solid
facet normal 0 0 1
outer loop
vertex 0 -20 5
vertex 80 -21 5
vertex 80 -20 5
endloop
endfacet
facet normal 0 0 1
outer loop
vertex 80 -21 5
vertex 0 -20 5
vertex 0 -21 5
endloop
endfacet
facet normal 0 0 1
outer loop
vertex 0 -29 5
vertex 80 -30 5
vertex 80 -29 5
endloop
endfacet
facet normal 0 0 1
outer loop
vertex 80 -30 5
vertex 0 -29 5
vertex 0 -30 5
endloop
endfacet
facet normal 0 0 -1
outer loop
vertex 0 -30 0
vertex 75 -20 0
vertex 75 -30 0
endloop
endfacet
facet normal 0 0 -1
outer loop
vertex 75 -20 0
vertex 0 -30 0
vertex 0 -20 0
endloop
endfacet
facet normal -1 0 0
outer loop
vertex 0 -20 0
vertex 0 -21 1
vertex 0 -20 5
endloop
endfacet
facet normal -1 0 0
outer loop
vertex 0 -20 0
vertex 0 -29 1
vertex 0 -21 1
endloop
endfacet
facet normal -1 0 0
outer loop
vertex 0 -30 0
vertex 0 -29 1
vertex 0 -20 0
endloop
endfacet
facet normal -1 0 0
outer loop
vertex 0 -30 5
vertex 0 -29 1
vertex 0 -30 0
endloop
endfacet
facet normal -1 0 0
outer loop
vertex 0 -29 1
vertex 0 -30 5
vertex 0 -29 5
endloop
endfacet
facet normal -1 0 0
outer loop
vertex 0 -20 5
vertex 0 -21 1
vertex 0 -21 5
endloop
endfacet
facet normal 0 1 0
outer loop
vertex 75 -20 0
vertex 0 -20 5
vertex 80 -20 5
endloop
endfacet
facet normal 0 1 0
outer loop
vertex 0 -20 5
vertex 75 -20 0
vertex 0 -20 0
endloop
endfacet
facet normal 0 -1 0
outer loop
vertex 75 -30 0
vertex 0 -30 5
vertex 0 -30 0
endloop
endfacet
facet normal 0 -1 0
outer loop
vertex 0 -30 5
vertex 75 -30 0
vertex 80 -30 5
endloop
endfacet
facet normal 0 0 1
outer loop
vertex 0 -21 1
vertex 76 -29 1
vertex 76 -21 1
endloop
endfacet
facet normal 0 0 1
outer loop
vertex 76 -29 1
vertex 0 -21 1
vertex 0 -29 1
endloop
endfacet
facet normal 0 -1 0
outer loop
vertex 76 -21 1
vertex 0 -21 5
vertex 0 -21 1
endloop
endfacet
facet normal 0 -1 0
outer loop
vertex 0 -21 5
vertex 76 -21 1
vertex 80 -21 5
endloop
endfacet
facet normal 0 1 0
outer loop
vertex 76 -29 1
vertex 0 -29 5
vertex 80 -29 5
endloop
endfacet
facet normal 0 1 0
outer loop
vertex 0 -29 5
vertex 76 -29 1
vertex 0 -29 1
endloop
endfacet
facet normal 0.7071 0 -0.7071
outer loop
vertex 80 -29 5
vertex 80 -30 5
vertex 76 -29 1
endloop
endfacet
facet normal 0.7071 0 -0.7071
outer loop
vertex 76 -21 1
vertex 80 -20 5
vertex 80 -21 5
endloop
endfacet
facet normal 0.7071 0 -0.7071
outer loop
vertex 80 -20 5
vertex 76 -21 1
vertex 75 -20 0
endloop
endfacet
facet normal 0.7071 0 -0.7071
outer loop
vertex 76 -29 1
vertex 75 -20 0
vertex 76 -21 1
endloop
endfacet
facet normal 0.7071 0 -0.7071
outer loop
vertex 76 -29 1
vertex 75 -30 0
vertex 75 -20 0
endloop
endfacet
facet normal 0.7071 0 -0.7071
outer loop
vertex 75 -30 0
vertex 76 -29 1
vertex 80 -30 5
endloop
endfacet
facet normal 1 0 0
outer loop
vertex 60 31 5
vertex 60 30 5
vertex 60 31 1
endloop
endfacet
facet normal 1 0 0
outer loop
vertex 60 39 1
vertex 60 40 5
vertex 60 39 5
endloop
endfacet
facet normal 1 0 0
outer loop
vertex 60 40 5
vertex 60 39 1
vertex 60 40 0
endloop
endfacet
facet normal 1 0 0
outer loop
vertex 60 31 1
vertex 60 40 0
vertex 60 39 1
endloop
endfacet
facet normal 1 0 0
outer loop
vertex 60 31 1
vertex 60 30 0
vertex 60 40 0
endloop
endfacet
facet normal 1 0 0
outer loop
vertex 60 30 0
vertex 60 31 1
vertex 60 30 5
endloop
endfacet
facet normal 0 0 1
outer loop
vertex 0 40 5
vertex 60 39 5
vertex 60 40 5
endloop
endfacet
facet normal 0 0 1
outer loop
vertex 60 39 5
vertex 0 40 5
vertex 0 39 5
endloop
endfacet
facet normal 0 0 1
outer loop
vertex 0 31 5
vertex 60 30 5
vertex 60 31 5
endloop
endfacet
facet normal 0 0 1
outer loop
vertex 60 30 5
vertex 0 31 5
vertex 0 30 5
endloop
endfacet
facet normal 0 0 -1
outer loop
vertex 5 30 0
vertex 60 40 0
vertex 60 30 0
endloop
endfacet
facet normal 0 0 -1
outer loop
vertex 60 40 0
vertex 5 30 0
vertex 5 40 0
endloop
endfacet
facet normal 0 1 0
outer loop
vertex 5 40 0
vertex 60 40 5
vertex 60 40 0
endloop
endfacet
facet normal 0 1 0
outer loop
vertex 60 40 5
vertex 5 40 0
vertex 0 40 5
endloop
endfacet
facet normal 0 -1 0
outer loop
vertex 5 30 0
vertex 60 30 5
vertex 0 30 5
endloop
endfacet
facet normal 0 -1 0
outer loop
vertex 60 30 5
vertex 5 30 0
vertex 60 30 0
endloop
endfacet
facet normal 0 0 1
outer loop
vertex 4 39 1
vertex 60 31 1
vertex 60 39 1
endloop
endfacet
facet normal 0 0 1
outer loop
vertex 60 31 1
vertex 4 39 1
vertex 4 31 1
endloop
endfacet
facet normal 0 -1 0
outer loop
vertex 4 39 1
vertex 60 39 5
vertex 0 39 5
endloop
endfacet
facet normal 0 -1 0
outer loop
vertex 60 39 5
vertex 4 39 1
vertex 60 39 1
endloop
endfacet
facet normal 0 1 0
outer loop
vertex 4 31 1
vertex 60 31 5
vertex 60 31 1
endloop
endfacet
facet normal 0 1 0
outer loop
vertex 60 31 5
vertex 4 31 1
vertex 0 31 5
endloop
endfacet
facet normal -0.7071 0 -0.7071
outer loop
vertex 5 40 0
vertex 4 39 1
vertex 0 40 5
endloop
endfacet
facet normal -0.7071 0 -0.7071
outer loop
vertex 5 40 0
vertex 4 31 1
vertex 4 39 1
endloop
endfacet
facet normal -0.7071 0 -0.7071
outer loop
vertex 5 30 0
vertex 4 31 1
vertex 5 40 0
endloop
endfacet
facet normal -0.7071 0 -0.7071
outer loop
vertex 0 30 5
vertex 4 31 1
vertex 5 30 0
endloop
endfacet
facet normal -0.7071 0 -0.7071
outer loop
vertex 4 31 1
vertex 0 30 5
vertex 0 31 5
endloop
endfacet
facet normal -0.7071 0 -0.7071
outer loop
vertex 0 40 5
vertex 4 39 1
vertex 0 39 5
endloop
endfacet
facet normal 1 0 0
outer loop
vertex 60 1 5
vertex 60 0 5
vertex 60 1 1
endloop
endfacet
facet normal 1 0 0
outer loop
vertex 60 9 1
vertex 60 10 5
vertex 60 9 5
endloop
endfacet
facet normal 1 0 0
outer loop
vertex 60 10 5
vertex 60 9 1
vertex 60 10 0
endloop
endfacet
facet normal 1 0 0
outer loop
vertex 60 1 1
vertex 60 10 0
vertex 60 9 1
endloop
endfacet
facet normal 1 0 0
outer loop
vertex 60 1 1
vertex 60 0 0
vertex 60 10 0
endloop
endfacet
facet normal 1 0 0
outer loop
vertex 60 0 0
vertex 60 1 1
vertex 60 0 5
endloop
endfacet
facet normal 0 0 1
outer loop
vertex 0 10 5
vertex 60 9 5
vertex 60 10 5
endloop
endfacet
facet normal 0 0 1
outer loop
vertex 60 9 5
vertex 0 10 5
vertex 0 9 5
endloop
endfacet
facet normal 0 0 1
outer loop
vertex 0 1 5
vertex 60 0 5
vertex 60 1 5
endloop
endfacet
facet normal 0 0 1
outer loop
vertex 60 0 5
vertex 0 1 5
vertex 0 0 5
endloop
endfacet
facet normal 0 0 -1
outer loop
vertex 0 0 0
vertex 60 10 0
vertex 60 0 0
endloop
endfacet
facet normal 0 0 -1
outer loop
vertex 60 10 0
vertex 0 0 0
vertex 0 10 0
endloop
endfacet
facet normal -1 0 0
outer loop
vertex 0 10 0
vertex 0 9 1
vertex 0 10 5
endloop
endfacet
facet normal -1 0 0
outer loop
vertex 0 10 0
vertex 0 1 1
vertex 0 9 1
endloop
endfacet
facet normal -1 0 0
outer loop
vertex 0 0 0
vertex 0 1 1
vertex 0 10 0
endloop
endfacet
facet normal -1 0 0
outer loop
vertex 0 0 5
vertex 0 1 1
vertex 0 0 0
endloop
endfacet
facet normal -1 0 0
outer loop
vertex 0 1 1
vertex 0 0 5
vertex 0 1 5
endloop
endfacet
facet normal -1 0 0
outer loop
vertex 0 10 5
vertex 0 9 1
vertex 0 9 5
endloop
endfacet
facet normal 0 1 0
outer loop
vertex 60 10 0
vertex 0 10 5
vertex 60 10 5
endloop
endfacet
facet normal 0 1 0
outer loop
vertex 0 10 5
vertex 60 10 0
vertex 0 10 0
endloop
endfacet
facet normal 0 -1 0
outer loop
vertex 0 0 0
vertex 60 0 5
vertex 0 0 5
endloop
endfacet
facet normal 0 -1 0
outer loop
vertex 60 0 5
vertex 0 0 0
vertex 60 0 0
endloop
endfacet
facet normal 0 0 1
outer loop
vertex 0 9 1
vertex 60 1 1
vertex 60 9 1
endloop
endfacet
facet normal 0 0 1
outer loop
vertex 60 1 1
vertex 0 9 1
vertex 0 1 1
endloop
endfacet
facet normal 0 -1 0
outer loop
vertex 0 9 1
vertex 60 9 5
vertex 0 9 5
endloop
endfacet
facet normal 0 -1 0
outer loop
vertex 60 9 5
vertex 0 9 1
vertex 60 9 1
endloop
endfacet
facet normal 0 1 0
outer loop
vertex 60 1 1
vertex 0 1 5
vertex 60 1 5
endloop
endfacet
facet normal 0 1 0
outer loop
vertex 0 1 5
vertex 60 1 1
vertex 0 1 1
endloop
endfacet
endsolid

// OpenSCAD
// file: shapes.scad
//helper
{
    /**
 * Standard right-angled triangle
 *
 * @param number  o_len  Length of the opposite side
 * @param number  a_len  Length of the adjacent side
 * @param number  depth  How wide/deep the triangle is in the 3rd dimension
 * @param boolean center Whether to center the triangle on the origin
 * @todo a better way ?
 */
module triangle(o_len, a_len, depth, center=false)
{
    centroid = center ? [-a_len/3, -o_len/3, -depth/2] : [0, 0, 0];
    translate(centroid) linear_extrude(height=depth)
    {
        polygon(points=[[0,0],[a_len,0],[0,o_len]], paths=[[0,1,2]]);
    }
}

module trapez3d(bottom = 30, top = 25, height = 10, length = 172){
    hull(){
            trapez(bottom, top, height);
            translate([length,0,0])
            trapez(bottom, top, height);
    }    
}

module trapez(bottom = 30, top = 25, height = 10){
    echo("haha");
    off = (bottom-top);
    CubePoints = [
  [  0,  0,  0 ],  //0
  [ 0,  bottom,  0 ],  //1
  [ 0,  bottom-off,  height ],  //2
  [  0,  off,  height ]  //3
];
CubeFaces = [
  [0,1,2,3]  // bottom
  ]; // left
  
polyhedron( CubePoints, CubeFaces );
}

}

module grid(g_breite=40, g_hoehe=60, felder_lenks=2, felder_hoch=3, achsen_breite=1, achsen_tiefe=3){
    
   //assert(felder_lenks>0, "felder_lenks must be greater 0");
   // assert(felder_hoch>0, "felder_hoch must be greater 0");
    
    schritt_breite = (g_breite-achsen_breite)/felder_lenks;
    schritt_hoehe = (g_hoehe-achsen_breite)/felder_hoch;
    
    if(felder_lenks>0){
    for(lenks=[0:felder_lenks]){
        translate([lenks*schritt_breite,0,0])
        cube([achsen_breite, achsen_tiefe, g_hoehe]);
    }}
    
    if(felder_hoch>0){
    for(hoch=[0:felder_hoch]){
        translate([0,0,hoch*schritt_hoehe])
        cube([g_breite, achsen_tiefe, achsen_breite]);
    }}
}
// main file
use <shapes.scad>
//settings
{
    //enable details for final rendering
    balken_an = false;

    laenge = 180;
    breite = 90;
    hoehe = 80;

    gleis_breite = 43;
    gleis_hoehe = 15;

    c_gleis_breite = 40;
    c_gleis_schiene = 2.3;
    c_gleis_boden = 8;
    c_gleis_hoehe = c_gleis_boden+c_gleis_schiene;
    c_gleis_laenge = 188;
    c_gleis_spurweite = 16.5;

    dicke = 1;

    eingang_hoehe = gleis_hoehe + 50;
    eingang_breite = 60;

    fenster_rahmen = 15;
    fenster_hoehe = 40;
    fenster_boden_abstand=20;
    fenster_breite = 0;
    farbe_fenster = "blue";

    boden_rand = 10;

    gehweg_hoehe  =20;
    gehweg_breite = 12;
    
    kabel_kanal_breite = 10;
    kabel_kanal_hoehe = 5;
}
 
 
//elements
{
module wall(laenge, hoehe, dicke, fenster=0){
    fenster_breite = (laenge-((fenster+1)*fenster_rahmen))/fenster;
    difference(){
        union(){
            cube([laenge, dicke, hoehe]);
            if(balken_an){
                for(bar=[1:3*dicke:laenge]){
                    translate([bar, 1,0]){
                        cube([dicke, dicke, hoehe]);
                    }
                }
            }
        }
        //fenster
        if(fenster>0){
            
            for(count=[0:fenster-1]){
                translate([fenster_rahmen+(count*(fenster_rahmen+fenster_breite)),-1,fenster_boden_abstand]){
                    cube([fenster_breite,10,  fenster_hoehe]);
                    //fenster_innen
                    
                }
            }
            
            
        }
        
    }
    //fenster_inlet
    if(fenster > 0){
        for(count=[0:fenster-1]){
                translate([fenster_rahmen+(count*(fenster_rahmen+fenster_breite)),-1,fenster_boden_abstand]){
                    fenster_inlet(fenster_breite, fenster_hoehe);
                    //fenster_innen
                    
                }
            }
        
        
    }
    
}
module fenster_inlet(breite=20, hoehe=30, tiefe =2, rand = 3){
    breite = breite -1;//speilraum
    hoehe = hoehe -1;//speilraum
    //ausrichtung am innenfenster (nicht am kleberand)
    color(farbe_fenster)
    translate([-rand+0.5, 0, -rand+0.5]){
        //innen
        translate([rand, 0,rand])
        grid(breite, hoehe, 1, 3, 1, 3);
        //hinten
        grid(breite+2*rand, hoehe+2*rand, 1, 1, 3, 1);
        
    }
    
}



module dach(){
    
    fenster_hohe=20;
    fenster_tiefe=30;
    fenster_breite=150;
    
    pos1x=20;
    pos1y=10;
    pos2x=20;
    pos2y=60;
    
    difference(){
        
            union(){
            cube([laenge+4*dicke, breite+8*dicke, dicke]);
            translate([pos1x,pos1y,0])
                dachecke(fenster_hohe,fenster_tiefe,fenster_breite);
            translate([pos2x,pos2y,0])
                dachecke(fenster_hohe,fenster_tiefe,fenster_breite);
            }
            //dach decken löcher
            translate([pos1x+2,pos1y+2,-3])
                cube([fenster_breite-4,fenster_tiefe-8,4]);
            translate([pos2x+2,pos2y+2,-3])
                cube([fenster_breite-4,fenster_tiefe-8,4]);
           // translate([20,60,0])
          //      cube(fenster_breite,fenster_tiefe,10);
            
            
            
            
        }    
    
}

module dachecke(ecke_hohe=20, ecke_breite=30, distance=150){
    rotate([90,0,90]){
        difference(){
            hull(){
                triangle(ecke_hohe,ecke_breite,1);
                translate([0,0,distance])
                triangle(ecke_hohe,ecke_breite,1);
            }
            translate([-1,0,dicke])
            hull(){
                triangle(ecke_hohe-dicke,ecke_breite-dicke,1);
                translate([0,0,distance-2*dicke])
                triangle(ecke_hohe-dicke,ecke_breite-dicke,1);
            }
        }
        translate([0,0,distance*1/4])
                triangle(ecke_hohe,ecke_breite,1);
        translate([0,0,distance*2/4])
                triangle(ecke_hohe,ecke_breite,1);
        translate([0,0,distance*3/4])
                triangle(ecke_hohe,ecke_breite,1);
        
    }
    color(farbe_fenster){
    translate([0,-2,1])
    grid(distance+1, ecke_hohe-1, 4,1,1, 1);
    translate([0,-1,1])
    grid(distance+1, ecke_hohe-1, 0,1,1, 0.3);
    }
}



module boden(){
    
    boden_beite=breite+2*boden_rand;
    boden_laenge=laenge+ 1*boden_rand;
    
    pos1x=20;
    pos1y=10;
    pos2x=20;
    pos2y=60;
    
    difference(){
            translate([-boden_rand/2,-breite/2-boden_rand,-dicke])
            union(){
                cube([boden_laenge,boden_beite , 2*dicke]);
            
            }
            //schinen ausschnitt
            translate([-boden_rand,-breite/2-boden_rand,-dicke])
            translate([3*boden_rand,boden_beite/2-gleis_breite/2,-1])
            cube([laenge, gleis_breite, 20]);
            
            // linke wand
            translate([0,breite/2,0])
            wall(laenge, hoehe, 2.5*dicke, 4);

            // rechte wand
            translate([laenge,-breite/2,0])
            rotate([0,0,180])
            wall(laenge, hoehe, 2.5*dicke, 4);
            
            // hinten wand
            translate([2.5,-breite/2,0])
            rotate([0,0,90])
            wall(breite, hoehe, 2.5*dicke);
                
            // eingang wand
            translate([laenge-2.5,breite/2,0])
            rotate([0,0,-90])
            difference(){
                wall(breite, hoehe, 2.5*dicke);
                translate([(breite/2)-(eingang_breite/2),-dicke,0]){
                    cube([eingang_breite, 4*dicke, eingang_hoehe]);
                }
            }
        }
        
    //gehweg links
    translate([boden_rand*3,-gleis_breite/2-gehweg_breite- 5 ,0])
    gehweg();    
    //gehweg rechts
    translate([boden_rand*3,gleis_breite/2 + 5 ,0])
    gehweg(); 
    
}

module gehweg() {
    gehweg_laenge = laenge *3/6;
    translate([0,0,gehweg_hoehe])
    cube([gehweg_laenge+2*dicke, gehweg_breite, dicke]);
    
    pfosten = 6;
    abstand = gehweg_laenge/(pfosten-1);
    for(count = [0:pfosten-1]){
        translate([count*abstand,0,0])
        cube([2*dicke, gehweg_breite, gehweg_hoehe]);
    }
    //treppe hinten
    translate([-gehweg_hoehe-1, 0, 0])
    treppe();
    
    translate([gehweg_laenge+gehweg_hoehe+3, gehweg_breite, 0])
    rotate([0,0,180])
    treppe();
}

module treppe(){
    
    for(step=[1:2:gehweg_hoehe]){
            translate([step,0,0])
            cube([2, gehweg_breite, step]);
    }
}



module tuer(){
    tuer_breite = eingang_breite/2 - 1;
    tuer_hoehe = eingang_hoehe-gleis_hoehe - 2;
    
    f_rahmen = 5;
    f_hoehe = tuer_hoehe/3;
    f_breite = tuer_breite - 2*f_rahmen;
    
    difference(){
        union(){
            cube([tuer_breite, dicke, tuer_hoehe]); 
            if(balken_an){
                //deko
                d_hoehe=3;
                for(step=[0:5]){
                    translate([f_breite+f_rahmen,0,5+(step*d_hoehe)])
                    rotate([90,0,-90])                
                    triangle(d_hoehe,1,f_breite);
                }
            
            }
        }
        //fenster
        
        translate([f_rahmen,-1, tuer_hoehe-f_hoehe-f_rahmen])
        cube([f_breite,3,f_hoehe]);
        
    }
}
module gleis(x_offset, y_offset){
    translate([x_offset, y_offset,0]){
        if(balken_an){
            color("grey")
            trapez3d(c_gleis_breite, c_gleis_breite-8, c_gleis_boden, c_gleis_laenge);
            translate([0,c_gleis_breite/2-c_gleis_spurweite/2-c_gleis_schiene/2,c_gleis_boden])
            color("black")
            cube([c_gleis_laenge,c_gleis_schiene, c_gleis_schiene]);
            translate([0,c_gleis_breite/2+c_gleis_spurweite/2-c_gleis_schiene/2,c_gleis_boden])
            color("black")
            cube([c_gleis_laenge,c_gleis_schiene, c_gleis_schiene]);
        }
        else{
            cube([c_gleis_laenge, c_gleis_breite, c_gleis_hoehe]);
        }
    }
}
}
module u_kanal(u_breite=10, u_hoehe= 4, u_laenge=50, u_dicke=1, cut_top_left=false, cut_top_right=false, cut_bottom_left=false, cut_bottom_right=false){
    
    difference(){
       
       cube([ u_laenge, u_breite, u_hoehe]);
       translate([-u_dicke, u_dicke, u_dicke])
       cube([ u_laenge+2*u_dicke, u_breite-2*dicke, u_hoehe]);
        
        if(cut_top_left){
             translate([0,-u_dicke,0])
            rotate([0,-45,0])
            cube(u_breite+u_hoehe);
        }
        if(cut_top_right){
            translate([u_laenge,-u_dicke,0])
            rotate([0,-45,0])
            cube(u_breite+u_hoehe);
        }
        if(cut_bottom_left){
            translate([0,-u_dicke,u_hoehe])
            rotate([0,135,0])
            cube(u_breite+u_hoehe);
        }
        if(cut_bottom_right){
            translate([u_laenge,-u_dicke,u_hoehe])
            rotate([0,135,0])
            cube(u_breite+u_hoehe);
        }
    }
    
}



//putt it together
%union(){
// linke wand
translate([0,breite/2,0])
wall(laenge, hoehe, dicke, 4);

// rechte wand
translate([laenge,-breite/2,0])
rotate([0,0,180])
wall(laenge, hoehe, dicke, 4);


// hinten wand
translate([0,-breite/2,0])
rotate([0,0,90])
wall(breite, hoehe, dicke);
    
// eingang wand
translate([laenge,breite/2,0])
rotate([0,0,-90])
difference(){
    wall(breite, hoehe, dicke);
    translate([(breite/2)-(eingang_breite/2),-dicke,0]){
        cube([eingang_breite, 4*dicke, eingang_hoehe]);
    }
};
// tür lings
translate([laenge+5,0,gleis_hoehe]){
rotate([0,0,90]){
tuer();
}
}
// tür rechts
translate([laenge+5,-eingang_breite/2,gleis_hoehe]){
rotate([0,0,90]){
tuer();
}
} 
// dach
translate([-2*dicke,-breite/2-2*dicke,hoehe+dicke])
dach();

// fenster_inlet(fenster_breite=20, fenster_hoehe);

// boden

boden();


    


%gleis(3*boden_rand, -c_gleis_breite/2);

}

kabel_kanal_drucken = true;
if(kabel_kanal_drucken){
    !union(){
        translate([0,-3*kabel_kanal_breite,0])
        u_kanal(kabel_kanal_breite,5,hoehe, cut_bottom_right=true);
        translate([0,3*kabel_kanal_breite,0])
        u_kanal(kabel_kanal_breite,kabel_kanal_hoehe,laenge/3, cut_bottom_left=true);
        u_kanal(kabel_kanal_breite,kabel_kanal_hoehe,laenge/3);
    }
    
}else{
    !union(){
    //kabel kanal wand hinten
    translate([kabel_kanal_breite,0,0])
    rotate([0,-90,0])
    u_kanal(kabel_kanal_breite,5,hoehe, cut_bottom_right=true);
    //kabel kanal oben
    translate([kabel_kanal_hoehe,0,hoehe-kabel_kanal_hoehe])
    u_kanal(kabel_kanal_breite,kabel_kanal_hoehe,laenge/3, cut_bottom_left=true);
    //led strip halter
    translate([laenge/3+kabel_kanal_hoehe,kabel_kanal_breite,hoehe])
    rotate([180,0,0])
    u_kanal(kabel_kanal_breite,kabel_kanal_hoehe,laenge/3);
}
    }
